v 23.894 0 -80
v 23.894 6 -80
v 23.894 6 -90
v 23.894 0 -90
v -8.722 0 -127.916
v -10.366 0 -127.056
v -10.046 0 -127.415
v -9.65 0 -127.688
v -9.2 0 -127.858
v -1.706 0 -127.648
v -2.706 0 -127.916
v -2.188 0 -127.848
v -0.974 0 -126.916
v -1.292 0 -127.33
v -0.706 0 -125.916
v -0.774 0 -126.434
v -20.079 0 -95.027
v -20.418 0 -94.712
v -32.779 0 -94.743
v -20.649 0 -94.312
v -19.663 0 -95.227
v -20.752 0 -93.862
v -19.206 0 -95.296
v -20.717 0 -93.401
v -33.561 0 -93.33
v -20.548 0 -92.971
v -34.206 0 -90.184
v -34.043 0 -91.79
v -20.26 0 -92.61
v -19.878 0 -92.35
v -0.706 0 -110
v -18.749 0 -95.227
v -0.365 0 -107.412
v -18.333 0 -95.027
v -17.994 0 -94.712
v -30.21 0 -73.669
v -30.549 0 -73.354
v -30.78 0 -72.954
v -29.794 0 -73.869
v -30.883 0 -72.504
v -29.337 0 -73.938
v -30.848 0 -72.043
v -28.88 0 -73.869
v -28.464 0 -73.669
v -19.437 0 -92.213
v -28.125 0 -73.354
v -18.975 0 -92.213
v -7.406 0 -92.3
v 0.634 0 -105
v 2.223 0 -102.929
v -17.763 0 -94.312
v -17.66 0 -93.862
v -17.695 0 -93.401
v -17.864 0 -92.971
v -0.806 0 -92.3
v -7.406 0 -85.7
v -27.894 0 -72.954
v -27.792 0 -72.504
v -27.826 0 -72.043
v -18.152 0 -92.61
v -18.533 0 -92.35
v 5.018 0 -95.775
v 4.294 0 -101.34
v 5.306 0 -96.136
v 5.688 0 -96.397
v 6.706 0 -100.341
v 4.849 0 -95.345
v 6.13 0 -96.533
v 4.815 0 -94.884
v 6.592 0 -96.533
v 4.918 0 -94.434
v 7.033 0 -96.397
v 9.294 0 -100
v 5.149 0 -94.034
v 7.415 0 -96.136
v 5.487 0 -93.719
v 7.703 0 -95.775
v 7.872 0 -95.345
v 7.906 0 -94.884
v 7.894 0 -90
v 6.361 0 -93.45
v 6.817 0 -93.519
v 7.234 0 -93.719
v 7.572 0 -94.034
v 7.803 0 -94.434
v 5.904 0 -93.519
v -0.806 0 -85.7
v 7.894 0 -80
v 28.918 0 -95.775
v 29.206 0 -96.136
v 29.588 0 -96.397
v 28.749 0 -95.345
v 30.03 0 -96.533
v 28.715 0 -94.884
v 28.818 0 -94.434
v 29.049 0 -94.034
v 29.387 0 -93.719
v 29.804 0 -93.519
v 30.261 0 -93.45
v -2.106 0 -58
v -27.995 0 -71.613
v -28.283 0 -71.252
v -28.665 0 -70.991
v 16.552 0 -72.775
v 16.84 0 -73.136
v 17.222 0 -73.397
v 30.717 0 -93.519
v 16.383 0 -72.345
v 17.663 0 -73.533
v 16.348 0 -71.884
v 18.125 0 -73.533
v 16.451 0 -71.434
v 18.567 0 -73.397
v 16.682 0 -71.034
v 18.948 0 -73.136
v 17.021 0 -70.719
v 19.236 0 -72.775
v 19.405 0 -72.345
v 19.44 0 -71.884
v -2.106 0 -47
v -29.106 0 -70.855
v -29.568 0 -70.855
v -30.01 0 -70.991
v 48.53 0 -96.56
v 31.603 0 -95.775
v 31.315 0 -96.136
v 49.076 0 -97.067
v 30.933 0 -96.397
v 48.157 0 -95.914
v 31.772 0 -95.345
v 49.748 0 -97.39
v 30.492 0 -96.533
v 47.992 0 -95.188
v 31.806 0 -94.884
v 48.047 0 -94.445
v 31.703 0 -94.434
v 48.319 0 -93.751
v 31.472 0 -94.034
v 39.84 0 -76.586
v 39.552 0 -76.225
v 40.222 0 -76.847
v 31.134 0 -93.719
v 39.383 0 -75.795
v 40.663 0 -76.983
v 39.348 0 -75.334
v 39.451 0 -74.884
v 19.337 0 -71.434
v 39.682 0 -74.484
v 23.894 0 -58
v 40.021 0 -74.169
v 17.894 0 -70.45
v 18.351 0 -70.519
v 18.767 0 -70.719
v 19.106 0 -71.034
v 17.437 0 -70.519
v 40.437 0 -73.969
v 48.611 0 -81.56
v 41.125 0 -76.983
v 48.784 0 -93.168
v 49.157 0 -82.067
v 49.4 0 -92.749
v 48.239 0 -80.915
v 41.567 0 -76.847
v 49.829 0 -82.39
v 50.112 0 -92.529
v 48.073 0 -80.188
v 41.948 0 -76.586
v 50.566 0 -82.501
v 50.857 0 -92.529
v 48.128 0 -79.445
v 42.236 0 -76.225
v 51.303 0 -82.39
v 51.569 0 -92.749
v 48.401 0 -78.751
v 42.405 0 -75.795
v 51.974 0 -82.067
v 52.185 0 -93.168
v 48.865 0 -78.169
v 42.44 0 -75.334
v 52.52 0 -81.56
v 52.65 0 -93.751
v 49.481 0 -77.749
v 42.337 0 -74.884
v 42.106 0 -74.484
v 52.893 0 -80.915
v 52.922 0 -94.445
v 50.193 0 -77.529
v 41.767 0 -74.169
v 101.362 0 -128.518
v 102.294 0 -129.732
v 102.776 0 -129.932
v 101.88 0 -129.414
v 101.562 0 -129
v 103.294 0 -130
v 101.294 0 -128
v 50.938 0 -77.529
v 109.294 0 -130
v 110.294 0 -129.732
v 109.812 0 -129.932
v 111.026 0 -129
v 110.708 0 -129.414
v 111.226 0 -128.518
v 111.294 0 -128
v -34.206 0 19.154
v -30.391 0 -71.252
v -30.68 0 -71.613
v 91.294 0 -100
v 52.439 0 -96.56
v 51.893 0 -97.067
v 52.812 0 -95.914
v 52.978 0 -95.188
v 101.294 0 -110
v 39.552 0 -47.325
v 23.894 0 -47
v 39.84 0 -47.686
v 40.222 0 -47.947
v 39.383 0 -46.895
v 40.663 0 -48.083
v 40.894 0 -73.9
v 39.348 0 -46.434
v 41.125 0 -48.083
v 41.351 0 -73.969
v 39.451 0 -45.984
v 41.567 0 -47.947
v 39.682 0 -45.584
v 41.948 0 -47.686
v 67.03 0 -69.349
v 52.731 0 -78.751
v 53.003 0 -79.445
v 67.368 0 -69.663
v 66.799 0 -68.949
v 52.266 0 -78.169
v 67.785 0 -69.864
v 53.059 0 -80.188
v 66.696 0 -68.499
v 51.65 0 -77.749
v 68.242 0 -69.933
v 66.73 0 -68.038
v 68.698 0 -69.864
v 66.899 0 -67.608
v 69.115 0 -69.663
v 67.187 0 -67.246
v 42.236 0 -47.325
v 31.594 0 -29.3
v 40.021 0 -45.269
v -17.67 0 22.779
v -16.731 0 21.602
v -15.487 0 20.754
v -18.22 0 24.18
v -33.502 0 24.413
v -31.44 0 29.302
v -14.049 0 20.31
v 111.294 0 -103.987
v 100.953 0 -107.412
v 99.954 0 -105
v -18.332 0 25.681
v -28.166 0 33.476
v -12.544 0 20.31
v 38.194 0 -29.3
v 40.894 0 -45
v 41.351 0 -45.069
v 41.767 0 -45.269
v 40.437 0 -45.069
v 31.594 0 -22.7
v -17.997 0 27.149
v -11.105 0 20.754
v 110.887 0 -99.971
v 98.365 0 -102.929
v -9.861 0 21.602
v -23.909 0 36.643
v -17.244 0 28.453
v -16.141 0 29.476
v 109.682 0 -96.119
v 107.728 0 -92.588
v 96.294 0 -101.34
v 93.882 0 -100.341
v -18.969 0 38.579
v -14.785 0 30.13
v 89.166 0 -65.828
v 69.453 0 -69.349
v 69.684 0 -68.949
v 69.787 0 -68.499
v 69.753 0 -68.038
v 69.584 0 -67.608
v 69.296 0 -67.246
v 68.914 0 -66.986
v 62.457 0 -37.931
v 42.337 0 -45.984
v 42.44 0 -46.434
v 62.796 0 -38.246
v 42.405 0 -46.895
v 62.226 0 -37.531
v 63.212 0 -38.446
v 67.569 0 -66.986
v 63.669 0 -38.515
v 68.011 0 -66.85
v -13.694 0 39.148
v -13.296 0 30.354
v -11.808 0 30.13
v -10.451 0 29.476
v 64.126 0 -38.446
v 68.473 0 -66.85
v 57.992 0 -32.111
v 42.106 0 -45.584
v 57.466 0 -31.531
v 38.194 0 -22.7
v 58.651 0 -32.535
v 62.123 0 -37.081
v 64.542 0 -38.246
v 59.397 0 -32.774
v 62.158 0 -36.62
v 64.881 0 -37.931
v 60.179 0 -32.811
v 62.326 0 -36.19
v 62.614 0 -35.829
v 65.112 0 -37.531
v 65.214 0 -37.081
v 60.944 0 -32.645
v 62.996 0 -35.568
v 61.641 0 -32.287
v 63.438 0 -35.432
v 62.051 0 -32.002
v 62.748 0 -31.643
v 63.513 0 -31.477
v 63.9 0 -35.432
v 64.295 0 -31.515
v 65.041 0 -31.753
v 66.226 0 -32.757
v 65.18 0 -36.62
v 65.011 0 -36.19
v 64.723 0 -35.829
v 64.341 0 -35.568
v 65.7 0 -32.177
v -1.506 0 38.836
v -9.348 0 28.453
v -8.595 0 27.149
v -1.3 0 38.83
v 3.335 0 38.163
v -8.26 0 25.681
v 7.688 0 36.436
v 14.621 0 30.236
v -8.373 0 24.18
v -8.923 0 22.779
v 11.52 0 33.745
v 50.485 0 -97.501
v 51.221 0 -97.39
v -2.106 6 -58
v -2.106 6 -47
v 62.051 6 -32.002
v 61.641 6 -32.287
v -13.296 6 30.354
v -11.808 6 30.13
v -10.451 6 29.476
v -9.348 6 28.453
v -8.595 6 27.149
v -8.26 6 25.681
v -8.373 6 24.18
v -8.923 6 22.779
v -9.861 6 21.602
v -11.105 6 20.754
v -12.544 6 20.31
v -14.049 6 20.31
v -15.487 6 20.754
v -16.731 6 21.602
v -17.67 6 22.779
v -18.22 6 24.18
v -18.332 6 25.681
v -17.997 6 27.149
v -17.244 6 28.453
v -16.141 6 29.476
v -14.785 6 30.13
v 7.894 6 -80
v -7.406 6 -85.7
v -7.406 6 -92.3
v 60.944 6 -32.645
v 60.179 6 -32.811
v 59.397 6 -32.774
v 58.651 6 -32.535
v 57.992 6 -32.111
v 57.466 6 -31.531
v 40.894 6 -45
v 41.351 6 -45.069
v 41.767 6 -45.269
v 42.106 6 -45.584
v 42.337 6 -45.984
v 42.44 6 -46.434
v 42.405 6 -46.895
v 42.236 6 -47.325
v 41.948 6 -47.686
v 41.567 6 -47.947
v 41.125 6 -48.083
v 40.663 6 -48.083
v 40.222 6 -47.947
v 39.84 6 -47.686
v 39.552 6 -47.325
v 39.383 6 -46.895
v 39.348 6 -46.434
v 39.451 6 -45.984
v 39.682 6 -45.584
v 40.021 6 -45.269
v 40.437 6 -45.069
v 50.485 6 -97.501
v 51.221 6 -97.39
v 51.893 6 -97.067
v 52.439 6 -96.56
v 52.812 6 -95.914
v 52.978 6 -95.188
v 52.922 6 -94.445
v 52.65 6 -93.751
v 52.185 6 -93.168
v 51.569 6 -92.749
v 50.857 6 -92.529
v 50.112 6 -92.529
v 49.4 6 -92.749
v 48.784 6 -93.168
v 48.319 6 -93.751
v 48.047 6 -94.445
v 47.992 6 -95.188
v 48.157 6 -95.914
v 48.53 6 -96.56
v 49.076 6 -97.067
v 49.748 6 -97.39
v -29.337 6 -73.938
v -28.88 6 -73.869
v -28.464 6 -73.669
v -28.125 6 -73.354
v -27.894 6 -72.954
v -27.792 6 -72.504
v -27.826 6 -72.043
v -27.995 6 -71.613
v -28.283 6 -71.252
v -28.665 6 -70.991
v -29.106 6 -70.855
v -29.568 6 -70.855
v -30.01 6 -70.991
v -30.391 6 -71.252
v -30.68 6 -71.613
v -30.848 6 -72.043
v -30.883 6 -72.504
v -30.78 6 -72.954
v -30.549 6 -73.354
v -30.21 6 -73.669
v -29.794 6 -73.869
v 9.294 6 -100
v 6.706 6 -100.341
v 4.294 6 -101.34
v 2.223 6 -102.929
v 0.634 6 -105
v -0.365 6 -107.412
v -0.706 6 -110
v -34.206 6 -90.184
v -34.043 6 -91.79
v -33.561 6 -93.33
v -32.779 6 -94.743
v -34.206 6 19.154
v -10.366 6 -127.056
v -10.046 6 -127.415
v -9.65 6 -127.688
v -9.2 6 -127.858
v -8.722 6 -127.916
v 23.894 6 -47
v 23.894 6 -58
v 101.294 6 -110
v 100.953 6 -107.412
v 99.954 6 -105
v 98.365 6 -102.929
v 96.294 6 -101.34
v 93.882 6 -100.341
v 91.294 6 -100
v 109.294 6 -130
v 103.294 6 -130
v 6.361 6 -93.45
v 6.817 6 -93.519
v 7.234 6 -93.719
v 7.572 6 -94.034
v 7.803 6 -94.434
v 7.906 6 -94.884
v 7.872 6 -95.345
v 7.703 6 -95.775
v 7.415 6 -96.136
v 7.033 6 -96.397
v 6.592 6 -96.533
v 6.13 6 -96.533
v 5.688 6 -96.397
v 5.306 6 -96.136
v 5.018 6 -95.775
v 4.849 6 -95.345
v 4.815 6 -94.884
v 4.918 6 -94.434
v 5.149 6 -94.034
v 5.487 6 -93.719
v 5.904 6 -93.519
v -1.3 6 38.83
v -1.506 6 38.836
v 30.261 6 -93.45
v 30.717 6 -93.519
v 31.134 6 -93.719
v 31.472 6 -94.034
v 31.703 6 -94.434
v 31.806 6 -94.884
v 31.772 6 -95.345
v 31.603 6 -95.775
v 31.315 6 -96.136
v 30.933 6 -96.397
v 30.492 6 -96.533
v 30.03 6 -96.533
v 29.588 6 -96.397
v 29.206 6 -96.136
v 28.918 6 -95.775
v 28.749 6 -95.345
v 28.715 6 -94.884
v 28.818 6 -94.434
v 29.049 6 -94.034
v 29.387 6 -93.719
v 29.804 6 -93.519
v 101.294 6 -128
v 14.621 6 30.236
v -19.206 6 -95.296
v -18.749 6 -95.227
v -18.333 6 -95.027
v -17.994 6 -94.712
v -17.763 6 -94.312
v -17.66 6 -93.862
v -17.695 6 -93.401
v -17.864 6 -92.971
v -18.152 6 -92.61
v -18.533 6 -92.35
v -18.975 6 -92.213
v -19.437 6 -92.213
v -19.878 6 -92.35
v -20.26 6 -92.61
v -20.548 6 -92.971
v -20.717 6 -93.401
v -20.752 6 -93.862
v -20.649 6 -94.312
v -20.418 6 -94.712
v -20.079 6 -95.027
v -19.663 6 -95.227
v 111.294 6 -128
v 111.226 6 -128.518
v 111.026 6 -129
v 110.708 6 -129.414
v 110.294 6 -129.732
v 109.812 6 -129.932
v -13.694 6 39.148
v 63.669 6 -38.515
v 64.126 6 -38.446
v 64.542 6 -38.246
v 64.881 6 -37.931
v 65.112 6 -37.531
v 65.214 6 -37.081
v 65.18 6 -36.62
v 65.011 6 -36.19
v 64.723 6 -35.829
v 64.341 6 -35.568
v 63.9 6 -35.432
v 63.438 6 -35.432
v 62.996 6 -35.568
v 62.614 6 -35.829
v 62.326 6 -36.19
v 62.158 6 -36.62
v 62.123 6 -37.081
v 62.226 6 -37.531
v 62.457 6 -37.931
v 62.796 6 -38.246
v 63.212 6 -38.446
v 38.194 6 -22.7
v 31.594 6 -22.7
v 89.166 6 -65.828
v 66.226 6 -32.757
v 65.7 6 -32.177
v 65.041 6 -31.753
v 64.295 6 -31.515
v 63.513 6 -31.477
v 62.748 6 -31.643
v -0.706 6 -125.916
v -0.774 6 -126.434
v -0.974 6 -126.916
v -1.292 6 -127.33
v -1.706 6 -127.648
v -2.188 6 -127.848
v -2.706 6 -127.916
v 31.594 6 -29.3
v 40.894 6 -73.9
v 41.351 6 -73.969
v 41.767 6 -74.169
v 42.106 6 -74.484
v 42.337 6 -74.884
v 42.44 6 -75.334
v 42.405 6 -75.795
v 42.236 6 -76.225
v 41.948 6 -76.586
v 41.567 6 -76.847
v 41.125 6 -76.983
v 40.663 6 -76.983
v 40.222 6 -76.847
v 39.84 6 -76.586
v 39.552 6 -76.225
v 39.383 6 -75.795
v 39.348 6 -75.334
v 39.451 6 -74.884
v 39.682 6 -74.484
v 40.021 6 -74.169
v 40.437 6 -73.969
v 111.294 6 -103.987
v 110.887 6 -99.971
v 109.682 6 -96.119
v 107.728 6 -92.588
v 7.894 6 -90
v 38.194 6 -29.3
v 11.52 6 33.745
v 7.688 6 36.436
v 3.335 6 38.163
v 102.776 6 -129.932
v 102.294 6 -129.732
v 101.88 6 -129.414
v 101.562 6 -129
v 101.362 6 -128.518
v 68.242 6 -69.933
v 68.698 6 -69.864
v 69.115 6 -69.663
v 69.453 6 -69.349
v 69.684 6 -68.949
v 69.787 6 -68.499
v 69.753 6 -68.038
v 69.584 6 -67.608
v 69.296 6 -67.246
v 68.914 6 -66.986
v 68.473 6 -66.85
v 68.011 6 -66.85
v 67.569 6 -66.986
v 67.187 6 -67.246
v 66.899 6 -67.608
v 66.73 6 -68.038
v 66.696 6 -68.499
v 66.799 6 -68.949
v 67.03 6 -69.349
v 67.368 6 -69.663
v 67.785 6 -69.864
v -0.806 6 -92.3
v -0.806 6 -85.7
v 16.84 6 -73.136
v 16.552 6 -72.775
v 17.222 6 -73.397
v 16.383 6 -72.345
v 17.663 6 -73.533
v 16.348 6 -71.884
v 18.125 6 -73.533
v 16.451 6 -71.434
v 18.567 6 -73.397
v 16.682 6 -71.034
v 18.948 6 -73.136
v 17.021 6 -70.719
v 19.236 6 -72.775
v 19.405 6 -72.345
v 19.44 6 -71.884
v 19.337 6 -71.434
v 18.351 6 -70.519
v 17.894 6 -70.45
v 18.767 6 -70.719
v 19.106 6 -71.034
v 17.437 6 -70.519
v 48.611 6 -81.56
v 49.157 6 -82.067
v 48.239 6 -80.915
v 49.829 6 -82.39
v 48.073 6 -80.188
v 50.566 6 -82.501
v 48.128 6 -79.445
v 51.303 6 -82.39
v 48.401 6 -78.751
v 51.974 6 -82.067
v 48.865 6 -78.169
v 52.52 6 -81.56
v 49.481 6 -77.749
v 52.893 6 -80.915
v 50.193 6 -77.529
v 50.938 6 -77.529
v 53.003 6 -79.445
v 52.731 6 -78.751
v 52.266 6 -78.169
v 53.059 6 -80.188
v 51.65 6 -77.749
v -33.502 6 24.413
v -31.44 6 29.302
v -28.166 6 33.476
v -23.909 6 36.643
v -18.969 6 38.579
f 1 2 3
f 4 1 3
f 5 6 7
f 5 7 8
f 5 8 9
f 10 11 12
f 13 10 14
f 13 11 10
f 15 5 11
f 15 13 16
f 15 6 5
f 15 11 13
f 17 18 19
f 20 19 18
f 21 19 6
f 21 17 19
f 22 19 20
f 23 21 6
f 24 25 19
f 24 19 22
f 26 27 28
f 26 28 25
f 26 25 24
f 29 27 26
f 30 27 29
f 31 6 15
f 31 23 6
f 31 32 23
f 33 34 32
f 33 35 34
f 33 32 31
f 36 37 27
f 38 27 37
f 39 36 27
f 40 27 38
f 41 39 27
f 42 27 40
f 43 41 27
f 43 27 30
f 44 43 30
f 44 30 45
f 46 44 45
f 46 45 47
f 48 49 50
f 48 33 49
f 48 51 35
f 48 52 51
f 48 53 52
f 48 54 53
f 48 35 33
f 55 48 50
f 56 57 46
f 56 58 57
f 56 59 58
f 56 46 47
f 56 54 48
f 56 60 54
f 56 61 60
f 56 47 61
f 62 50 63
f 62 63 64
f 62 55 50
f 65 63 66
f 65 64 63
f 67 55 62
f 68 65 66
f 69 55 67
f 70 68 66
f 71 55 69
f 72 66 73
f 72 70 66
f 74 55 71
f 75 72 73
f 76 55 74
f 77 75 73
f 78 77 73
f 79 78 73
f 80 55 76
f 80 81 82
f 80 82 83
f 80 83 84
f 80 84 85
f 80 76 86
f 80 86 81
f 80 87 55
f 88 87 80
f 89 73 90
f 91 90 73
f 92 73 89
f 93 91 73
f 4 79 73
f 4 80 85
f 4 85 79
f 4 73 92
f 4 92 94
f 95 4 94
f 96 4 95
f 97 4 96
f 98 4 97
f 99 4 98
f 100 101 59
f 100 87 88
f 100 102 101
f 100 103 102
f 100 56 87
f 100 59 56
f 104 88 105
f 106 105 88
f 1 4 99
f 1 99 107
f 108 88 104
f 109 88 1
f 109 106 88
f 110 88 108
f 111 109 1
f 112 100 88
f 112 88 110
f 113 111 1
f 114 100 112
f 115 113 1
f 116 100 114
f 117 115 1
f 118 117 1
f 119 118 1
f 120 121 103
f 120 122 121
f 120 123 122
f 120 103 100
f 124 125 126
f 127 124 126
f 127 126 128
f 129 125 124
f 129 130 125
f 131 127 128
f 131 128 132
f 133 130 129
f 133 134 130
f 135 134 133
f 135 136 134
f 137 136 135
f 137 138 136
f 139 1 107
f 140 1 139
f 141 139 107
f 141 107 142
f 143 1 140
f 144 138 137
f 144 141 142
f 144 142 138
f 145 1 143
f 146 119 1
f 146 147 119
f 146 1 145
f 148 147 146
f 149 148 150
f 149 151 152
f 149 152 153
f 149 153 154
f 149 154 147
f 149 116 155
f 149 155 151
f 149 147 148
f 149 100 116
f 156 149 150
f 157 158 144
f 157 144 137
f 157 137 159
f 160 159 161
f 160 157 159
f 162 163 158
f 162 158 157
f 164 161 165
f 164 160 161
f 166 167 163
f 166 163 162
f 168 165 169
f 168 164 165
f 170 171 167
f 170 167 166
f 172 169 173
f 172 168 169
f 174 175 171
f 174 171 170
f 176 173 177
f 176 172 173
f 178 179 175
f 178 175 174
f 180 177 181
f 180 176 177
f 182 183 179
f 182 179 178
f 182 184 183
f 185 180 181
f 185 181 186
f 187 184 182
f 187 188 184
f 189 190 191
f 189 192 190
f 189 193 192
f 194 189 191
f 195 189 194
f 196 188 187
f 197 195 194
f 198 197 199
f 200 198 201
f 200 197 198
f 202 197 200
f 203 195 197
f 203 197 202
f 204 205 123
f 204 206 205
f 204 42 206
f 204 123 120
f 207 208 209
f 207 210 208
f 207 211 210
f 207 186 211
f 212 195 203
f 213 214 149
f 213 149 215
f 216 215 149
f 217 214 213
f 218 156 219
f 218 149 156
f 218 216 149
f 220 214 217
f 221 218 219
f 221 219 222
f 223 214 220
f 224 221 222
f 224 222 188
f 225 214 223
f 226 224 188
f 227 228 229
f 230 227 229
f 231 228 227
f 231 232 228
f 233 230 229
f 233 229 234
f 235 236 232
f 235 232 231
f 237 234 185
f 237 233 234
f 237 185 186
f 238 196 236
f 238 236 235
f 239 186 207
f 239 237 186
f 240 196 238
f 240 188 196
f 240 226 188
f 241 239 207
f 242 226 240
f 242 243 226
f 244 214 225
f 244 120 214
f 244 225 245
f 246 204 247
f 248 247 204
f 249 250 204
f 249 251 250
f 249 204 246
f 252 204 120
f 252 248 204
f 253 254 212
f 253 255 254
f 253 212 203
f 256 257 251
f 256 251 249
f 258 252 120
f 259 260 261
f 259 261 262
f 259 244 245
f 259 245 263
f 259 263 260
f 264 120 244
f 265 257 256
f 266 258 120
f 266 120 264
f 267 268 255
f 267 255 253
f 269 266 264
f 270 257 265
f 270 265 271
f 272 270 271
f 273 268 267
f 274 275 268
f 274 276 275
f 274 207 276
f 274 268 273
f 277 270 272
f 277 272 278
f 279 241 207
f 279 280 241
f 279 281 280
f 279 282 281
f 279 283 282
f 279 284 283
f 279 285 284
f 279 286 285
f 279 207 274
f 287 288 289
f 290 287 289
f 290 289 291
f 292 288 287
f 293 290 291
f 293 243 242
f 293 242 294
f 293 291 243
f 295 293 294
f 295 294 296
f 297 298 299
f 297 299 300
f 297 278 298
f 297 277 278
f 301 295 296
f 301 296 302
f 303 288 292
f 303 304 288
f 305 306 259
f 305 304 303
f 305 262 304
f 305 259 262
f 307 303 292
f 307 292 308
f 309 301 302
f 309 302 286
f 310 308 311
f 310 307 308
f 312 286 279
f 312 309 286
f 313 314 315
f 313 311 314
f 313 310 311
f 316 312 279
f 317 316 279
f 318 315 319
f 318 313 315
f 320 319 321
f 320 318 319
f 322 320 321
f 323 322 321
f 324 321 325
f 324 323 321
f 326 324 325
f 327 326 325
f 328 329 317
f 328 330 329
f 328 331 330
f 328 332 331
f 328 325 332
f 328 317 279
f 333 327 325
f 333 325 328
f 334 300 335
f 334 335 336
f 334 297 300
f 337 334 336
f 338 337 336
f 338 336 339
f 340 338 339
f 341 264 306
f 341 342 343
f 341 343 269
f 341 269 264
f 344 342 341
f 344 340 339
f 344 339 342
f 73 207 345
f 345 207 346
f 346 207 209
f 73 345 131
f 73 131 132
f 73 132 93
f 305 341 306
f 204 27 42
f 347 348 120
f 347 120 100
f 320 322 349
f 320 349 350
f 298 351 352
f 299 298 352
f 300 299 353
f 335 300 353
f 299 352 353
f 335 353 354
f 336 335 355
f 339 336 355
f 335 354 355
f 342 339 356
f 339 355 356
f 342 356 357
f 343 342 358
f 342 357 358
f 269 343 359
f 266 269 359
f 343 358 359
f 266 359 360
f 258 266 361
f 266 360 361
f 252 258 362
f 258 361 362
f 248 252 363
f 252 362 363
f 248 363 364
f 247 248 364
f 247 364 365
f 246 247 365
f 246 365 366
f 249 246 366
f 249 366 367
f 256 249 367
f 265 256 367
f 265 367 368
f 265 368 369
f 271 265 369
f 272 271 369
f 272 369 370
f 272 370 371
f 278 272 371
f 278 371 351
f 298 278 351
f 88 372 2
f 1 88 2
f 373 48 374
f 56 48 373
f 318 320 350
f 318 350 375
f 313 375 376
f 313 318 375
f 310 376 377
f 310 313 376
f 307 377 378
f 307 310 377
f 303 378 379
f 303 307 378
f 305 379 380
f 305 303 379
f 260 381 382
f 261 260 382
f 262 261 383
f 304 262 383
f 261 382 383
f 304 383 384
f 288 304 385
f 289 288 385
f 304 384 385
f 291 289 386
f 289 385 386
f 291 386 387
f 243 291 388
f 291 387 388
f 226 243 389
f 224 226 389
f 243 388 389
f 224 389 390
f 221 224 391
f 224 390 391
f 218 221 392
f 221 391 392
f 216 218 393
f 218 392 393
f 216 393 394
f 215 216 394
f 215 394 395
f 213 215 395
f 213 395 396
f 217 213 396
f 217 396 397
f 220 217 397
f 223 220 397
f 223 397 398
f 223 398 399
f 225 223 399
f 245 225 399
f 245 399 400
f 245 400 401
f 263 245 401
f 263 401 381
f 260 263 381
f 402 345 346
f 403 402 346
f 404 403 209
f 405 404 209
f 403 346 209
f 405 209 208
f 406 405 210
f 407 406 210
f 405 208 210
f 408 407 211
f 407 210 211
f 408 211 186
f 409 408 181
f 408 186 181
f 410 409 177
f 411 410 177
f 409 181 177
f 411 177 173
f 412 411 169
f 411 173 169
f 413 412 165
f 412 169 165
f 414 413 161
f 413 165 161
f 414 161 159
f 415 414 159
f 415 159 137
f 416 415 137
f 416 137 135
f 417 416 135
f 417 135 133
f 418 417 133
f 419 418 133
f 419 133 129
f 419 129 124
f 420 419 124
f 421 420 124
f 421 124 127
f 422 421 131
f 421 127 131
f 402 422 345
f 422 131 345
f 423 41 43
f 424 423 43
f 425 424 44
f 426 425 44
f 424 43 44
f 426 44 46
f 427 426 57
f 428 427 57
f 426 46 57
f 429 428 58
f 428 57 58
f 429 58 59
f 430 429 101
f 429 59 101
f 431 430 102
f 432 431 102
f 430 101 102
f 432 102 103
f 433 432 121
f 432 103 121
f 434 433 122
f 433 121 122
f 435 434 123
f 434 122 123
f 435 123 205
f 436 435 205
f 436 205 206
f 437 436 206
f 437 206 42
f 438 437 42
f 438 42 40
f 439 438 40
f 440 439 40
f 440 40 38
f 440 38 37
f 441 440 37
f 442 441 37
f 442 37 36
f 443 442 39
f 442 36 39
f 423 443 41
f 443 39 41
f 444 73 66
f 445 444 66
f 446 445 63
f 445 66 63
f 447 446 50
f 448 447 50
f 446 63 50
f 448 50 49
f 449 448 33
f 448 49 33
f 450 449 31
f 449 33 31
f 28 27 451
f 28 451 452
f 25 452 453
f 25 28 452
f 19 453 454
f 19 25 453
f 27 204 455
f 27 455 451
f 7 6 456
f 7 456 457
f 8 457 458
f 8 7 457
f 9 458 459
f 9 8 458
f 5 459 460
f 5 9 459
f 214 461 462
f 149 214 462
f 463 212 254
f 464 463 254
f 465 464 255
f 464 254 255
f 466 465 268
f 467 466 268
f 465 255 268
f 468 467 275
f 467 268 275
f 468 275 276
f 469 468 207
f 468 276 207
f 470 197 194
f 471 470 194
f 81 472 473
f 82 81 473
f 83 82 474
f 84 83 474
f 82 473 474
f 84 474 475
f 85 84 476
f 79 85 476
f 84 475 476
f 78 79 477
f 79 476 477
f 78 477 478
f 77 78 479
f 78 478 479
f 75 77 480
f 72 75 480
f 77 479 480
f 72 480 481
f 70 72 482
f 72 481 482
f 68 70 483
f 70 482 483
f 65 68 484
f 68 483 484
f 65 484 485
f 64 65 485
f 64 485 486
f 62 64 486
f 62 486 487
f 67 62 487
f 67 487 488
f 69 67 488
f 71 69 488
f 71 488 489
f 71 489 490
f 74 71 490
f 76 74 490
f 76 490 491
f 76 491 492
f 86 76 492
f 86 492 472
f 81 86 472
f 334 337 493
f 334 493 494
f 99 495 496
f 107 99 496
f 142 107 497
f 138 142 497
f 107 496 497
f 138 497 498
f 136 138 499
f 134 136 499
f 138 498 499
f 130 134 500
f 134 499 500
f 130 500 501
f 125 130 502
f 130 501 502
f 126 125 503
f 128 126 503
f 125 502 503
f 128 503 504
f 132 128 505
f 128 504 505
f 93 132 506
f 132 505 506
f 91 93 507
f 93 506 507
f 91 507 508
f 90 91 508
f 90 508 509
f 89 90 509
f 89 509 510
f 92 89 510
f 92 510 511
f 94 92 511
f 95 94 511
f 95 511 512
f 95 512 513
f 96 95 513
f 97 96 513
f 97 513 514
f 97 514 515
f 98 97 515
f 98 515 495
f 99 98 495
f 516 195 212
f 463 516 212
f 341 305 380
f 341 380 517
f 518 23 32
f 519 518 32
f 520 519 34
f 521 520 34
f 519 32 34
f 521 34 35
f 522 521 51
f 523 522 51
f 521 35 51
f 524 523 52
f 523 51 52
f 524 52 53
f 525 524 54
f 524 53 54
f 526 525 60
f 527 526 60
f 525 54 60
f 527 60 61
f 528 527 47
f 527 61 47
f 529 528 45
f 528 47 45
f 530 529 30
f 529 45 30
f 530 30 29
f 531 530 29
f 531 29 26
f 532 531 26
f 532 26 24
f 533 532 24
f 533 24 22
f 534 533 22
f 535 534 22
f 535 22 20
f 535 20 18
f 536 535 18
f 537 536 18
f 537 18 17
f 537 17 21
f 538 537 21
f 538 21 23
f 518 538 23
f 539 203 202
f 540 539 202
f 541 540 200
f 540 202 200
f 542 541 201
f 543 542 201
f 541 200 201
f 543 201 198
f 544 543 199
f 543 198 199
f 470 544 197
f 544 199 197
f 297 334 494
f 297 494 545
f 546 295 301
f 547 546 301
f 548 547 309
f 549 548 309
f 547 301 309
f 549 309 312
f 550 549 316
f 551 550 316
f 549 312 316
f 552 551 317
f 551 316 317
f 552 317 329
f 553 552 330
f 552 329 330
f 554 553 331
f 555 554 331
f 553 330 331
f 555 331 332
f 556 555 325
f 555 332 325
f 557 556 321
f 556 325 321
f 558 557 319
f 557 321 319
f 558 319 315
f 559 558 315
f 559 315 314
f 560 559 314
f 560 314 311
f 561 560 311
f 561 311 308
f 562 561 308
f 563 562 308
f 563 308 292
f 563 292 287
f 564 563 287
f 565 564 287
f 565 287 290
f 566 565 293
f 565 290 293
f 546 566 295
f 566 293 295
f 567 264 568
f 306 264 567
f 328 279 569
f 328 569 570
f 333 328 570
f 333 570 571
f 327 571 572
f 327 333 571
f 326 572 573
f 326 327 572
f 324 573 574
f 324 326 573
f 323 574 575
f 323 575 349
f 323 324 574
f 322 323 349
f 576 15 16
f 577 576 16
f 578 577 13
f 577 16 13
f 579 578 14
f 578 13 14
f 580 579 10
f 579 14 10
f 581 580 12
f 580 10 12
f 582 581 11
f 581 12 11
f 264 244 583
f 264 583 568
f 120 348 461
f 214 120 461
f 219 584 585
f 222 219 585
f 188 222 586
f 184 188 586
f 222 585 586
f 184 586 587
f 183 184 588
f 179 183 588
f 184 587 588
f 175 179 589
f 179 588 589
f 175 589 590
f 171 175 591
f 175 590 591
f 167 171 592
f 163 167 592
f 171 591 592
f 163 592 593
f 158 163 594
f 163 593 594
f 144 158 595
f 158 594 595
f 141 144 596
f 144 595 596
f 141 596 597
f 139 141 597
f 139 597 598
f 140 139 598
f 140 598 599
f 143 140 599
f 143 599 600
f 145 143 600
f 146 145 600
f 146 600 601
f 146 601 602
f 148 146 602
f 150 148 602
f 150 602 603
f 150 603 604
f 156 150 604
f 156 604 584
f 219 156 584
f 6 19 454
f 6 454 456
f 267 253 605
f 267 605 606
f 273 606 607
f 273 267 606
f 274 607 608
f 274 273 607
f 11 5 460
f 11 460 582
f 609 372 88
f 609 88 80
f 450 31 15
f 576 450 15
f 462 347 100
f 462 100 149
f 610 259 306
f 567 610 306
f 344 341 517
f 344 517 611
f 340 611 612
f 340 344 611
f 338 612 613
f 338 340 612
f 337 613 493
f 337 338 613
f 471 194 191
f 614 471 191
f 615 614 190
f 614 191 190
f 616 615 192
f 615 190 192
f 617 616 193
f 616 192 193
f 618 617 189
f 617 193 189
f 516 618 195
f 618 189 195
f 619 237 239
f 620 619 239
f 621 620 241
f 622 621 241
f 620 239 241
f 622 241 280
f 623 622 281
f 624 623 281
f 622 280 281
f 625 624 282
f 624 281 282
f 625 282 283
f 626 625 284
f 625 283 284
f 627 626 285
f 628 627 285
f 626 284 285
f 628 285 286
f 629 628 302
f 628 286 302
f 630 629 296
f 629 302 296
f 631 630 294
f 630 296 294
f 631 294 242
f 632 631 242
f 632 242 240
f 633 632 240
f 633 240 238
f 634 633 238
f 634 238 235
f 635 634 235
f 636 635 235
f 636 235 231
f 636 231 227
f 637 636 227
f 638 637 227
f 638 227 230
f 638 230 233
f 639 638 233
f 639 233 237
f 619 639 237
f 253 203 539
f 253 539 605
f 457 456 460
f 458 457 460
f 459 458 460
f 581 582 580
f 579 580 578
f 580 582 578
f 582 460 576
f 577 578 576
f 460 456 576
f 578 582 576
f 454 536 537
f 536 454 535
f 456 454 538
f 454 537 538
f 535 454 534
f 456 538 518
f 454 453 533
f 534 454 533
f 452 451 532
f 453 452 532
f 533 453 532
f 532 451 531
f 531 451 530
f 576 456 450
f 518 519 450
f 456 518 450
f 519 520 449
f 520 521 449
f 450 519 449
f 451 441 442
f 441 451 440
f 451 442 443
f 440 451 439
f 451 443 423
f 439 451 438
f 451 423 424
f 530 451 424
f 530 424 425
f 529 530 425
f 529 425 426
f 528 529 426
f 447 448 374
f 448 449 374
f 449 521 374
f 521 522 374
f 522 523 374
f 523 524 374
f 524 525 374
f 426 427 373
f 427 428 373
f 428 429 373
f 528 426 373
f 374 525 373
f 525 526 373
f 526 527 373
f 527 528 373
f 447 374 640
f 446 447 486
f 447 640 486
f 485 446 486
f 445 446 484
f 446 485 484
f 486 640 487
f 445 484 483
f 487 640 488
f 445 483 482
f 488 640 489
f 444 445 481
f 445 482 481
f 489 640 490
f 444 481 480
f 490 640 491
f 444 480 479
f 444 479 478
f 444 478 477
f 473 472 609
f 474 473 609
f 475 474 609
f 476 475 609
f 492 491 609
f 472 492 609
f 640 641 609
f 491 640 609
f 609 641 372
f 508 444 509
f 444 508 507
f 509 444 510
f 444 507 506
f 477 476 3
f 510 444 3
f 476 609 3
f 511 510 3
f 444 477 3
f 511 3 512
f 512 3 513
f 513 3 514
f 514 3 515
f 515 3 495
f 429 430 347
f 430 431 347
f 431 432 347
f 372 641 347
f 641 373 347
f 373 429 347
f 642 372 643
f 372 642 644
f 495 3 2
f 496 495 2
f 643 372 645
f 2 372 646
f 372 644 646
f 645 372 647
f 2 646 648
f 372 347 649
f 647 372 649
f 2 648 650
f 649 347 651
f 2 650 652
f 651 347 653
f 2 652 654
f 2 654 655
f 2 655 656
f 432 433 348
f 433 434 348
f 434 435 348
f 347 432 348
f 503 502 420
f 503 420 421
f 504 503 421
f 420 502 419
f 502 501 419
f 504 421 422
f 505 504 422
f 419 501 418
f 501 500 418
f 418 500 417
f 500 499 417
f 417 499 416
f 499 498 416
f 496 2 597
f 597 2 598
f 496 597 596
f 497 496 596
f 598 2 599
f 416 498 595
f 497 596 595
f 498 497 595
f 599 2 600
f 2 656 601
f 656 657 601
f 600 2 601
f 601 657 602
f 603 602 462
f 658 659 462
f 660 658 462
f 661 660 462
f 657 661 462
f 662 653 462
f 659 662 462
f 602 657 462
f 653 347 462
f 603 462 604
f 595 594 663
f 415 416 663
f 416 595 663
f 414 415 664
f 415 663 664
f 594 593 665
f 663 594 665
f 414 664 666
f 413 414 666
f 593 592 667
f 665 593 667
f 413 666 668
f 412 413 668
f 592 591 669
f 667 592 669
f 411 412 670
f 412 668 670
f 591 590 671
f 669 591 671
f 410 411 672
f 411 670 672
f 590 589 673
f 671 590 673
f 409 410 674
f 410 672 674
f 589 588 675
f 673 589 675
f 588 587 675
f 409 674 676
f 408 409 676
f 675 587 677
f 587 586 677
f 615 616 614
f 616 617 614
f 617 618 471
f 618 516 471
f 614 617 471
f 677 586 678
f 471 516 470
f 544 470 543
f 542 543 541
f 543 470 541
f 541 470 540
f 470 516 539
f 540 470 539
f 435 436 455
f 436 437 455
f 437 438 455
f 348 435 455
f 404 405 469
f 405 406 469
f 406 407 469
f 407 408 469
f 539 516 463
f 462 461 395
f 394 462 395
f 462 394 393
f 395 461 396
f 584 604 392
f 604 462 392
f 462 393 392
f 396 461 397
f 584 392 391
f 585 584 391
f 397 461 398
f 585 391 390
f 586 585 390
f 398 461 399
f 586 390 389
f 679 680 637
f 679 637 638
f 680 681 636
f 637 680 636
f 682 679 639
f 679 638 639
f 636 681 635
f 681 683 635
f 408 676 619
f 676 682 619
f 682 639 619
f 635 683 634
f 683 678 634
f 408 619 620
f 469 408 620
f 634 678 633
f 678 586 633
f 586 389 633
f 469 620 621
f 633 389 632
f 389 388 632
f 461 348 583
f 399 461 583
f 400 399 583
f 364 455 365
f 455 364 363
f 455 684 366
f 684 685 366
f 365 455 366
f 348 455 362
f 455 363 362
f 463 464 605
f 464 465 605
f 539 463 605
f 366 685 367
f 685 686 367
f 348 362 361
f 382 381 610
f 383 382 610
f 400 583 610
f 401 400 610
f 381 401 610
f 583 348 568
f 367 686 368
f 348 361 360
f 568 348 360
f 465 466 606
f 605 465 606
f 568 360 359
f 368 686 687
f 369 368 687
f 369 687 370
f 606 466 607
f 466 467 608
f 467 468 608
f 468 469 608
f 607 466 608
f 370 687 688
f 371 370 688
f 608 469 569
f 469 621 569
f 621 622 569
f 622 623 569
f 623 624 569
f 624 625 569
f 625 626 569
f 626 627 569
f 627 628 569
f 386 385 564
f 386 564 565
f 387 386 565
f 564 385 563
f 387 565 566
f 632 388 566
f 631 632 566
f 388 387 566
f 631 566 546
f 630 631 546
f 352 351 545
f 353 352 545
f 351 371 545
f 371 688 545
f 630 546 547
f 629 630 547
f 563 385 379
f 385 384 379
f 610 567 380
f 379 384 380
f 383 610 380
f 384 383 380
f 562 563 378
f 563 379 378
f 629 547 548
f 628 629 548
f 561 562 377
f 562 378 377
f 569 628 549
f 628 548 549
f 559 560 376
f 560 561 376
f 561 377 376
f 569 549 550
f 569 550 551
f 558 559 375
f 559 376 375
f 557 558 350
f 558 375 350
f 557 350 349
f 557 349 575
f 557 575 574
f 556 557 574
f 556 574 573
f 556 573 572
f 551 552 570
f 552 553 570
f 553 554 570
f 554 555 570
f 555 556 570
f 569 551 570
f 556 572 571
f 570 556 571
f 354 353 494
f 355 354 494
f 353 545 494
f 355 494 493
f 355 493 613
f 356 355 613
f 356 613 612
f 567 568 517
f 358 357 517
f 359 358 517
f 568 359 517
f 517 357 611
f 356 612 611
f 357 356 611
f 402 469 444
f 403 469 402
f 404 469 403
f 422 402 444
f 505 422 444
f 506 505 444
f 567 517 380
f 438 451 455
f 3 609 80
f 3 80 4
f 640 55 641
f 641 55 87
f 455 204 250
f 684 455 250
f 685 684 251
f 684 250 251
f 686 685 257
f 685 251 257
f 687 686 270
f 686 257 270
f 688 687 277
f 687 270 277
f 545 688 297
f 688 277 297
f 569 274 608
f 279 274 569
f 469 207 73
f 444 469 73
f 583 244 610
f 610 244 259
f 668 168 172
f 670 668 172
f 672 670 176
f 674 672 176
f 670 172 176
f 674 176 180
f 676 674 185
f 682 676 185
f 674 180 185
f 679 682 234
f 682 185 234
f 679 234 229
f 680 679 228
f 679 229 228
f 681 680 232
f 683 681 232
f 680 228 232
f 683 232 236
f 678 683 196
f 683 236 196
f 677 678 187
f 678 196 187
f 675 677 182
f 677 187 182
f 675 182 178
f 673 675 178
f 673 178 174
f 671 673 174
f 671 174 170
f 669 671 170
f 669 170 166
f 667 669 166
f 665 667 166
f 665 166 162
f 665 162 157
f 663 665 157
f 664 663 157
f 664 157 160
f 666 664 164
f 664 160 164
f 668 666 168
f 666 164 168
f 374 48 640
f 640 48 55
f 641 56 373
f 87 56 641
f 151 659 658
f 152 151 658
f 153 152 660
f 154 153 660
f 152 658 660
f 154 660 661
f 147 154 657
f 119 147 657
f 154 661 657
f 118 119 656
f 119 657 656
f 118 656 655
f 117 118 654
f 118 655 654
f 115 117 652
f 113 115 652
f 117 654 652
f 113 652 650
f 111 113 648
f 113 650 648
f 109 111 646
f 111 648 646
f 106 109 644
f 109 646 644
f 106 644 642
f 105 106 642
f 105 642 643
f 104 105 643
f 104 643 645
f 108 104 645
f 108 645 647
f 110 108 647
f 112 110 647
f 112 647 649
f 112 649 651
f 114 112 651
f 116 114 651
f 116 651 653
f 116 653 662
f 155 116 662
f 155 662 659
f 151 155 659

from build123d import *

# Parameters (mm, degrees)
DODANIE_WYCI_GNI_CIE1_DEPTH = 6
SZKIC3_R                    = 5.05
WYTNIJ_WYCI_GNI_CIE1_DEPTH  = 172.237795034
SZKIC5_R                    = 1.55
SZKIC5_W                    = 26
SZKIC5_H                    = 11
SZKIC5_W_2                  = 16
SZKIC5_H_2                  = 10
WYTNIJ_WYCI_GNI_CIE2_DEPTH  = 172.237795034
DODANIE_WYCI_GNI_CIE2_DEPTH = 6
SZKIC6_R                    = 1.55
WYTNIJ_WYCI_GNI_CIE3_DEPTH  = 172.237795034
DODANIE_WYCI_GNI_CIE3_DEPTH = 6
SZKIC9_R                    = 1.55
WYTNIJ_WYCI_GNI_CIE5_DEPTH  = 6
SZKIC11_R                   = 1.55
WYTNIJ_WYCI_GNI_CIE6_DEPTH  = 6
SZKIC15_R                   = 2.5
WYTNIJ_WYCI_GNI_CIE7_DEPTH  = 6
SZKIC8_R                    = 1.55
WYTNIJ_WYCI_GNI_CIE4_DEPTH  = 172.237795034
SZKIC20_W                   = 6.6
SZKIC20_H                   = 6.6
WYTNIJ_WYCI_GNI_CIE9_DEPTH  = 6
WYTNIJ_WYCI_GNI_CIE10_DEPTH = 10


with BuildPart() as part:
    # Szkic2 → Dodanie-wyciągnięcie1 (new body)
    with BuildSketch(Plane(origin=(0, 0, 0), x_dir=(1, 0, 0), z_dir=(0, 1, 0))):
        with BuildLine():
            Line((-2.705874152, 127.916025414), (-8.705874152, 127.916025414))
            ThreePointArc((-8.705874152, 127.916025414), (-10.120087715, 127.330238976), (-10.705874152, 125.916025414))
            Line((-10.705874152, 125.916025414), (-10.705874152, 88.696086508))
            ThreePointArc((-10.705874152, 88.696086508), (-11.877447027, 85.867659383), (-14.705874152, 84.696086508))
            Line((-14.705874152, 84.696086508), (-30.205874152, 84.696086508))
            ThreePointArc((-30.205874152, 84.696086508), (-33.034301277, 83.524513632), (-34.205874152, 80.696086508))
            Line((-34.205874152, 80.696086508), (-34.205874152, 69.929357434))
            Line((-34.205874152, 69.929357434), (-34.205874152, 68.036244156))
            Line((-34.205874152, 68.036244156), (-34.205874152, 10.604511111))
            Line((-34.205874152, 10.604511111), (-34.205874152, -19.154356935))
            ThreePointArc((-34.205874152, -19.154356935), (-21.880415638, -37.623287954), (-0.095732854, -33.328414665))
            Line((-0.095732854, -33.328414665), (14.157093559, -19.139859884))
            Line((14.157093559, -19.139859884), (55.027168237, 21.545915465))
            ThreePointArc((55.027168237, 21.545915465), (56.334805154, 23.495770338), (56.794125848, 25.798132784))
            Line((56.794125848, 25.798132784), (56.794125848, 30.935818421))
            Line((56.794125848, 30.935818421), (56.794125848, 59.333926751))
            ThreePointArc((56.794125848, 59.333926751), (64.677605901, 81.048439594), (85.935948442, 90.090131813))
            Line((85.935948442, 90.090131813), (91.371133341, 90.090131813))
            ThreePointArc((91.371133341, 90.090131813), (105.458816444, 95.925441216), (111.294125848, 110.013124319))
            Line((111.294125848, 110.013124319), (111.294125848, 128))
            ThreePointArc((111.294125848, 128), (110.70833941, 129.414213562), (109.294125848, 130))
            Line((109.294125848, 130), (103.294125848, 130))
            ThreePointArc((103.294125848, 130), (101.879912285, 129.414213562), (101.294125848, 128))
            Line((101.294125848, 128), (101.294125848, 110))
            ThreePointArc((101.294125848, 110), (98.36519366, 102.928932188), (91.294125848, 100))
            Line((91.294125848, 100), (9.294125848, 100))
            ThreePointArc((9.294125848, 100), (2.223058036, 102.928932188), (-0.705874152, 110))
            Line((-0.705874152, 110), (-0.705874152, 125.916025414))
            ThreePointArc((-0.705874152, 125.916025414), (-1.29166059, 127.330238976), (-2.705874152, 127.916025414))
        make_face()
    extrude(amount=DODANIE_WYCI_GNI_CIE1_DEPTH)

    # Szkic3 → Wytnij-wyciągnięcie1 (cut, through all)
    with BuildSketch(Plane(origin=(0, 6, 0), x_dir=(1, 0, 0), z_dir=(0, 1, 0))):
        with Locations(Location((-13.29618586, -25.303913492, 0), (0, 0, 270))):
            Circle(SZKIC3_R)
    extrude(amount=-WYTNIJ_WYCI_GNI_CIE1_DEPTH, mode=Mode.SUBTRACT)

    # Szkic5 → Wytnij-wyciągnięcie2 (cut, through all)
    with BuildSketch(Plane(origin=(0, 6, 0), x_dir=(1, 0, 0), z_dir=(0, 1, 0))):
        with Locations(Location((40.894125848, 75.45, 0), (0, 0, 270))):
            Circle(SZKIC5_R)
        with Locations(Location((30.260526652, 95, 0), (0, 0, 270))):
            Circle(SZKIC5_R)
        with Locations(Location((6.360542819, 95, 0), (0, 0, 270))):
            Circle(SZKIC5_R)
        with Locations(Location((40.894125848, 46.55, 0), (0, 0, 270))):
            Circle(SZKIC5_R)
        with Locations(Location((17.894125848, 72, 0), (0, 0, 270))):
            Circle(SZKIC5_R)
        with Locations((10.894125848, 52.5)):
            Rectangle(SZKIC5_W, SZKIC5_H)
        with Locations((15.894125848, 85)):
            Rectangle(SZKIC5_W_2, SZKIC5_H_2)
    extrude(amount=-WYTNIJ_WYCI_GNI_CIE2_DEPTH, mode=Mode.SUBTRACT)

    # Szkic12 → Dodanie-wyciągnięcie2 (add)
    with BuildSketch(Plane.XZ):
        with BuildLine():
            Line((28.406352316, 21.766792401), (22.674893132, 30.029606522))
            ThreePointArc((22.674893132, 30.029606522), (15.741620567, 36.230120828), (6.753517107, 38.623996834))
            Line((6.753517107, 38.623996834), (-1.505533921, 38.835570804))
            Line((-1.505533921, 38.835570804), (-13.693695858, 39.147797694))
            Line((-13.693695858, 39.147797694), (55.027168237, -21.545915465))
            ThreePointArc((55.027168237, -21.545915465), (56.334805154, -23.495770338), (56.794125848, -25.798132784))
            Line((56.794125848, -25.798132784), (56.794125848, -59.333926751))
            ThreePointArc((56.794125848, -59.333926751), (64.677605901, -81.048439594), (85.935948442, -90.090131813))
            Line((85.935948442, -90.090131813), (91.371133341, -90.090131813))
            Line((91.371133341, -90.090131813), (111.294125848, -110.013124319))
            Line((111.294125848, -110.013124319), (111.294125848, -103.986622655))
            ThreePointArc((111.294125848, -103.986622655), (110.381700995, -98.014648527), (107.72767835, -92.58757216))
            Line((107.72767835, -92.58757216), (89.166132072, -65.828137643))
            Line((89.166132072, -65.828137643), (62.775344571, -27.781601032))
            Line((62.775344571, -27.781601032), (28.406352316, 21.766792401))
        make_face()
    extrude(amount=-DODANIE_WYCI_GNI_CIE2_DEPTH)

    # Szkic6 → Wytnij-wyciągnięcie3 (cut, through all)
    with BuildSketch(Plane.XZ):
        with Locations(Location((68.241593591, -68.382704099, 0), (0, 0, 270))):
            Circle(SZKIC6_R)
    extrude(amount=-WYTNIJ_WYCI_GNI_CIE3_DEPTH, mode=Mode.SUBTRACT)

    # Szkic13 → Dodanie-wyciągnięcie3 (add)
    with BuildSketch(Plane.XZ):
        with BuildLine():
            Line((-34.205874152, -80.696086508), (-34.205874152, -90.183506419))
            ThreePointArc((-34.205874152, -90.183506419), (-33.840904211, -92.57229607), (-32.779295153, -94.743126617))
            Line((-32.779295153, -94.743126617), (-10.365682355, -127.055930463))
            ThreePointArc((-10.365682355, -127.055930463), (-9.649740147, -127.688003136), (-8.722327105, -127.916025414))
            Line((-8.722327105, -127.916025414), (-6.264571206, -127.916025414))
            Line((-6.264571206, -127.916025414), (-6.264571206, -80.696086508))
            Line((-6.264571206, -80.696086508), (-8.705874152, -80.696086508))
            Line((-8.705874152, -80.696086508), (-34.205874152, -80.696086508))
        make_face()
    extrude(amount=-DODANIE_WYCI_GNI_CIE3_DEPTH)

    # Szkic9 → Wytnij-wyciągnięcie5 (cut)
    with BuildSketch(Plane.XZ):
        with Locations(Location((63.668699873, -36.96490988, 0), (0, 0, 270))):
            Circle(SZKIC9_R)
    extrude(amount=-WYTNIJ_WYCI_GNI_CIE5_DEPTH, mode=Mode.SUBTRACT)

    # Szkic11 → Wytnij-wyciągnięcie6 (cut)
    with BuildSketch(Plane.XZ):
        with Locations(Location((-29.337186675, -72.387878859, 0), (0, 0, 270))):
            Circle(SZKIC11_R)
    extrude(amount=-WYTNIJ_WYCI_GNI_CIE6_DEPTH, mode=Mode.SUBTRACT)

    # Szkic15 → Wytnij-wyciągnięcie7 (cut)
    with BuildSketch(Plane.XZ):
        with Locations(Location((50.565790386, -80.001305928, 0), (0, 0, 270))):
            Circle(SZKIC15_R)
        with Locations(Location((50.484519469, -95.001085761, 0), (0, 0, 270))):
            Circle(SZKIC15_R)
    extrude(amount=-WYTNIJ_WYCI_GNI_CIE7_DEPTH, mode=Mode.SUBTRACT)

    # Szkic8 → Wytnij-wyciągnięcie4 (cut, through all)
    with BuildSketch(Plane.XZ):
        with Locations(Location((-19.205874152, -93.746086504, 0), (0, 0, 270))):
            Circle(SZKIC8_R)
    extrude(amount=-WYTNIJ_WYCI_GNI_CIE4_DEPTH, mode=Mode.SUBTRACT)

    # Szkic20 → Wytnij-wyciągnięcie9 (cut)
    with BuildSketch(Plane.XZ):
        with Locations((34.894125848, -26)):
            Rectangle(SZKIC20_W, SZKIC20_H)
        with Locations((-4.105874152, -89)):
            Rectangle(SZKIC20_W, SZKIC20_H)
    extrude(amount=-WYTNIJ_WYCI_GNI_CIE9_DEPTH, mode=Mode.SUBTRACT)

    # Szkic21 → Wytnij-wyciągnięcie10 (cut)
    with BuildSketch(Plane.XZ):
        with BuildLine():
            Line((62.051453687, -32.001592967), (61.640614874, -32.286569229))
            ThreePointArc((61.640614874, -32.286569229), (59.396767724, -32.773629702), (57.465724425, -31.531393928))
            Line((57.465724425, -31.531393928), (14.621138886, 30.235921359))
            ThreePointArc((14.621138886, 30.235921359), (7.68786632, 36.436435664), (-1.300237139, 38.830311671))
            Line((-1.300237139, 38.830311671), (6.753517107, 38.623996834))
            ThreePointArc((6.753517107, 38.623996834), (15.741620567, 36.230120828), (22.674893132, 30.029606522))
            Line((22.674893132, 30.029606522), (66.226344136, -32.756768268))
            ThreePointArc((66.226344136, -32.756768268), (64.295300837, -31.514532495), (62.051453687, -32.001592967))
        make_face()
    extrude(amount=-WYTNIJ_WYCI_GNI_CIE10_DEPTH, mode=Mode.SUBTRACT)


solid = part.part
